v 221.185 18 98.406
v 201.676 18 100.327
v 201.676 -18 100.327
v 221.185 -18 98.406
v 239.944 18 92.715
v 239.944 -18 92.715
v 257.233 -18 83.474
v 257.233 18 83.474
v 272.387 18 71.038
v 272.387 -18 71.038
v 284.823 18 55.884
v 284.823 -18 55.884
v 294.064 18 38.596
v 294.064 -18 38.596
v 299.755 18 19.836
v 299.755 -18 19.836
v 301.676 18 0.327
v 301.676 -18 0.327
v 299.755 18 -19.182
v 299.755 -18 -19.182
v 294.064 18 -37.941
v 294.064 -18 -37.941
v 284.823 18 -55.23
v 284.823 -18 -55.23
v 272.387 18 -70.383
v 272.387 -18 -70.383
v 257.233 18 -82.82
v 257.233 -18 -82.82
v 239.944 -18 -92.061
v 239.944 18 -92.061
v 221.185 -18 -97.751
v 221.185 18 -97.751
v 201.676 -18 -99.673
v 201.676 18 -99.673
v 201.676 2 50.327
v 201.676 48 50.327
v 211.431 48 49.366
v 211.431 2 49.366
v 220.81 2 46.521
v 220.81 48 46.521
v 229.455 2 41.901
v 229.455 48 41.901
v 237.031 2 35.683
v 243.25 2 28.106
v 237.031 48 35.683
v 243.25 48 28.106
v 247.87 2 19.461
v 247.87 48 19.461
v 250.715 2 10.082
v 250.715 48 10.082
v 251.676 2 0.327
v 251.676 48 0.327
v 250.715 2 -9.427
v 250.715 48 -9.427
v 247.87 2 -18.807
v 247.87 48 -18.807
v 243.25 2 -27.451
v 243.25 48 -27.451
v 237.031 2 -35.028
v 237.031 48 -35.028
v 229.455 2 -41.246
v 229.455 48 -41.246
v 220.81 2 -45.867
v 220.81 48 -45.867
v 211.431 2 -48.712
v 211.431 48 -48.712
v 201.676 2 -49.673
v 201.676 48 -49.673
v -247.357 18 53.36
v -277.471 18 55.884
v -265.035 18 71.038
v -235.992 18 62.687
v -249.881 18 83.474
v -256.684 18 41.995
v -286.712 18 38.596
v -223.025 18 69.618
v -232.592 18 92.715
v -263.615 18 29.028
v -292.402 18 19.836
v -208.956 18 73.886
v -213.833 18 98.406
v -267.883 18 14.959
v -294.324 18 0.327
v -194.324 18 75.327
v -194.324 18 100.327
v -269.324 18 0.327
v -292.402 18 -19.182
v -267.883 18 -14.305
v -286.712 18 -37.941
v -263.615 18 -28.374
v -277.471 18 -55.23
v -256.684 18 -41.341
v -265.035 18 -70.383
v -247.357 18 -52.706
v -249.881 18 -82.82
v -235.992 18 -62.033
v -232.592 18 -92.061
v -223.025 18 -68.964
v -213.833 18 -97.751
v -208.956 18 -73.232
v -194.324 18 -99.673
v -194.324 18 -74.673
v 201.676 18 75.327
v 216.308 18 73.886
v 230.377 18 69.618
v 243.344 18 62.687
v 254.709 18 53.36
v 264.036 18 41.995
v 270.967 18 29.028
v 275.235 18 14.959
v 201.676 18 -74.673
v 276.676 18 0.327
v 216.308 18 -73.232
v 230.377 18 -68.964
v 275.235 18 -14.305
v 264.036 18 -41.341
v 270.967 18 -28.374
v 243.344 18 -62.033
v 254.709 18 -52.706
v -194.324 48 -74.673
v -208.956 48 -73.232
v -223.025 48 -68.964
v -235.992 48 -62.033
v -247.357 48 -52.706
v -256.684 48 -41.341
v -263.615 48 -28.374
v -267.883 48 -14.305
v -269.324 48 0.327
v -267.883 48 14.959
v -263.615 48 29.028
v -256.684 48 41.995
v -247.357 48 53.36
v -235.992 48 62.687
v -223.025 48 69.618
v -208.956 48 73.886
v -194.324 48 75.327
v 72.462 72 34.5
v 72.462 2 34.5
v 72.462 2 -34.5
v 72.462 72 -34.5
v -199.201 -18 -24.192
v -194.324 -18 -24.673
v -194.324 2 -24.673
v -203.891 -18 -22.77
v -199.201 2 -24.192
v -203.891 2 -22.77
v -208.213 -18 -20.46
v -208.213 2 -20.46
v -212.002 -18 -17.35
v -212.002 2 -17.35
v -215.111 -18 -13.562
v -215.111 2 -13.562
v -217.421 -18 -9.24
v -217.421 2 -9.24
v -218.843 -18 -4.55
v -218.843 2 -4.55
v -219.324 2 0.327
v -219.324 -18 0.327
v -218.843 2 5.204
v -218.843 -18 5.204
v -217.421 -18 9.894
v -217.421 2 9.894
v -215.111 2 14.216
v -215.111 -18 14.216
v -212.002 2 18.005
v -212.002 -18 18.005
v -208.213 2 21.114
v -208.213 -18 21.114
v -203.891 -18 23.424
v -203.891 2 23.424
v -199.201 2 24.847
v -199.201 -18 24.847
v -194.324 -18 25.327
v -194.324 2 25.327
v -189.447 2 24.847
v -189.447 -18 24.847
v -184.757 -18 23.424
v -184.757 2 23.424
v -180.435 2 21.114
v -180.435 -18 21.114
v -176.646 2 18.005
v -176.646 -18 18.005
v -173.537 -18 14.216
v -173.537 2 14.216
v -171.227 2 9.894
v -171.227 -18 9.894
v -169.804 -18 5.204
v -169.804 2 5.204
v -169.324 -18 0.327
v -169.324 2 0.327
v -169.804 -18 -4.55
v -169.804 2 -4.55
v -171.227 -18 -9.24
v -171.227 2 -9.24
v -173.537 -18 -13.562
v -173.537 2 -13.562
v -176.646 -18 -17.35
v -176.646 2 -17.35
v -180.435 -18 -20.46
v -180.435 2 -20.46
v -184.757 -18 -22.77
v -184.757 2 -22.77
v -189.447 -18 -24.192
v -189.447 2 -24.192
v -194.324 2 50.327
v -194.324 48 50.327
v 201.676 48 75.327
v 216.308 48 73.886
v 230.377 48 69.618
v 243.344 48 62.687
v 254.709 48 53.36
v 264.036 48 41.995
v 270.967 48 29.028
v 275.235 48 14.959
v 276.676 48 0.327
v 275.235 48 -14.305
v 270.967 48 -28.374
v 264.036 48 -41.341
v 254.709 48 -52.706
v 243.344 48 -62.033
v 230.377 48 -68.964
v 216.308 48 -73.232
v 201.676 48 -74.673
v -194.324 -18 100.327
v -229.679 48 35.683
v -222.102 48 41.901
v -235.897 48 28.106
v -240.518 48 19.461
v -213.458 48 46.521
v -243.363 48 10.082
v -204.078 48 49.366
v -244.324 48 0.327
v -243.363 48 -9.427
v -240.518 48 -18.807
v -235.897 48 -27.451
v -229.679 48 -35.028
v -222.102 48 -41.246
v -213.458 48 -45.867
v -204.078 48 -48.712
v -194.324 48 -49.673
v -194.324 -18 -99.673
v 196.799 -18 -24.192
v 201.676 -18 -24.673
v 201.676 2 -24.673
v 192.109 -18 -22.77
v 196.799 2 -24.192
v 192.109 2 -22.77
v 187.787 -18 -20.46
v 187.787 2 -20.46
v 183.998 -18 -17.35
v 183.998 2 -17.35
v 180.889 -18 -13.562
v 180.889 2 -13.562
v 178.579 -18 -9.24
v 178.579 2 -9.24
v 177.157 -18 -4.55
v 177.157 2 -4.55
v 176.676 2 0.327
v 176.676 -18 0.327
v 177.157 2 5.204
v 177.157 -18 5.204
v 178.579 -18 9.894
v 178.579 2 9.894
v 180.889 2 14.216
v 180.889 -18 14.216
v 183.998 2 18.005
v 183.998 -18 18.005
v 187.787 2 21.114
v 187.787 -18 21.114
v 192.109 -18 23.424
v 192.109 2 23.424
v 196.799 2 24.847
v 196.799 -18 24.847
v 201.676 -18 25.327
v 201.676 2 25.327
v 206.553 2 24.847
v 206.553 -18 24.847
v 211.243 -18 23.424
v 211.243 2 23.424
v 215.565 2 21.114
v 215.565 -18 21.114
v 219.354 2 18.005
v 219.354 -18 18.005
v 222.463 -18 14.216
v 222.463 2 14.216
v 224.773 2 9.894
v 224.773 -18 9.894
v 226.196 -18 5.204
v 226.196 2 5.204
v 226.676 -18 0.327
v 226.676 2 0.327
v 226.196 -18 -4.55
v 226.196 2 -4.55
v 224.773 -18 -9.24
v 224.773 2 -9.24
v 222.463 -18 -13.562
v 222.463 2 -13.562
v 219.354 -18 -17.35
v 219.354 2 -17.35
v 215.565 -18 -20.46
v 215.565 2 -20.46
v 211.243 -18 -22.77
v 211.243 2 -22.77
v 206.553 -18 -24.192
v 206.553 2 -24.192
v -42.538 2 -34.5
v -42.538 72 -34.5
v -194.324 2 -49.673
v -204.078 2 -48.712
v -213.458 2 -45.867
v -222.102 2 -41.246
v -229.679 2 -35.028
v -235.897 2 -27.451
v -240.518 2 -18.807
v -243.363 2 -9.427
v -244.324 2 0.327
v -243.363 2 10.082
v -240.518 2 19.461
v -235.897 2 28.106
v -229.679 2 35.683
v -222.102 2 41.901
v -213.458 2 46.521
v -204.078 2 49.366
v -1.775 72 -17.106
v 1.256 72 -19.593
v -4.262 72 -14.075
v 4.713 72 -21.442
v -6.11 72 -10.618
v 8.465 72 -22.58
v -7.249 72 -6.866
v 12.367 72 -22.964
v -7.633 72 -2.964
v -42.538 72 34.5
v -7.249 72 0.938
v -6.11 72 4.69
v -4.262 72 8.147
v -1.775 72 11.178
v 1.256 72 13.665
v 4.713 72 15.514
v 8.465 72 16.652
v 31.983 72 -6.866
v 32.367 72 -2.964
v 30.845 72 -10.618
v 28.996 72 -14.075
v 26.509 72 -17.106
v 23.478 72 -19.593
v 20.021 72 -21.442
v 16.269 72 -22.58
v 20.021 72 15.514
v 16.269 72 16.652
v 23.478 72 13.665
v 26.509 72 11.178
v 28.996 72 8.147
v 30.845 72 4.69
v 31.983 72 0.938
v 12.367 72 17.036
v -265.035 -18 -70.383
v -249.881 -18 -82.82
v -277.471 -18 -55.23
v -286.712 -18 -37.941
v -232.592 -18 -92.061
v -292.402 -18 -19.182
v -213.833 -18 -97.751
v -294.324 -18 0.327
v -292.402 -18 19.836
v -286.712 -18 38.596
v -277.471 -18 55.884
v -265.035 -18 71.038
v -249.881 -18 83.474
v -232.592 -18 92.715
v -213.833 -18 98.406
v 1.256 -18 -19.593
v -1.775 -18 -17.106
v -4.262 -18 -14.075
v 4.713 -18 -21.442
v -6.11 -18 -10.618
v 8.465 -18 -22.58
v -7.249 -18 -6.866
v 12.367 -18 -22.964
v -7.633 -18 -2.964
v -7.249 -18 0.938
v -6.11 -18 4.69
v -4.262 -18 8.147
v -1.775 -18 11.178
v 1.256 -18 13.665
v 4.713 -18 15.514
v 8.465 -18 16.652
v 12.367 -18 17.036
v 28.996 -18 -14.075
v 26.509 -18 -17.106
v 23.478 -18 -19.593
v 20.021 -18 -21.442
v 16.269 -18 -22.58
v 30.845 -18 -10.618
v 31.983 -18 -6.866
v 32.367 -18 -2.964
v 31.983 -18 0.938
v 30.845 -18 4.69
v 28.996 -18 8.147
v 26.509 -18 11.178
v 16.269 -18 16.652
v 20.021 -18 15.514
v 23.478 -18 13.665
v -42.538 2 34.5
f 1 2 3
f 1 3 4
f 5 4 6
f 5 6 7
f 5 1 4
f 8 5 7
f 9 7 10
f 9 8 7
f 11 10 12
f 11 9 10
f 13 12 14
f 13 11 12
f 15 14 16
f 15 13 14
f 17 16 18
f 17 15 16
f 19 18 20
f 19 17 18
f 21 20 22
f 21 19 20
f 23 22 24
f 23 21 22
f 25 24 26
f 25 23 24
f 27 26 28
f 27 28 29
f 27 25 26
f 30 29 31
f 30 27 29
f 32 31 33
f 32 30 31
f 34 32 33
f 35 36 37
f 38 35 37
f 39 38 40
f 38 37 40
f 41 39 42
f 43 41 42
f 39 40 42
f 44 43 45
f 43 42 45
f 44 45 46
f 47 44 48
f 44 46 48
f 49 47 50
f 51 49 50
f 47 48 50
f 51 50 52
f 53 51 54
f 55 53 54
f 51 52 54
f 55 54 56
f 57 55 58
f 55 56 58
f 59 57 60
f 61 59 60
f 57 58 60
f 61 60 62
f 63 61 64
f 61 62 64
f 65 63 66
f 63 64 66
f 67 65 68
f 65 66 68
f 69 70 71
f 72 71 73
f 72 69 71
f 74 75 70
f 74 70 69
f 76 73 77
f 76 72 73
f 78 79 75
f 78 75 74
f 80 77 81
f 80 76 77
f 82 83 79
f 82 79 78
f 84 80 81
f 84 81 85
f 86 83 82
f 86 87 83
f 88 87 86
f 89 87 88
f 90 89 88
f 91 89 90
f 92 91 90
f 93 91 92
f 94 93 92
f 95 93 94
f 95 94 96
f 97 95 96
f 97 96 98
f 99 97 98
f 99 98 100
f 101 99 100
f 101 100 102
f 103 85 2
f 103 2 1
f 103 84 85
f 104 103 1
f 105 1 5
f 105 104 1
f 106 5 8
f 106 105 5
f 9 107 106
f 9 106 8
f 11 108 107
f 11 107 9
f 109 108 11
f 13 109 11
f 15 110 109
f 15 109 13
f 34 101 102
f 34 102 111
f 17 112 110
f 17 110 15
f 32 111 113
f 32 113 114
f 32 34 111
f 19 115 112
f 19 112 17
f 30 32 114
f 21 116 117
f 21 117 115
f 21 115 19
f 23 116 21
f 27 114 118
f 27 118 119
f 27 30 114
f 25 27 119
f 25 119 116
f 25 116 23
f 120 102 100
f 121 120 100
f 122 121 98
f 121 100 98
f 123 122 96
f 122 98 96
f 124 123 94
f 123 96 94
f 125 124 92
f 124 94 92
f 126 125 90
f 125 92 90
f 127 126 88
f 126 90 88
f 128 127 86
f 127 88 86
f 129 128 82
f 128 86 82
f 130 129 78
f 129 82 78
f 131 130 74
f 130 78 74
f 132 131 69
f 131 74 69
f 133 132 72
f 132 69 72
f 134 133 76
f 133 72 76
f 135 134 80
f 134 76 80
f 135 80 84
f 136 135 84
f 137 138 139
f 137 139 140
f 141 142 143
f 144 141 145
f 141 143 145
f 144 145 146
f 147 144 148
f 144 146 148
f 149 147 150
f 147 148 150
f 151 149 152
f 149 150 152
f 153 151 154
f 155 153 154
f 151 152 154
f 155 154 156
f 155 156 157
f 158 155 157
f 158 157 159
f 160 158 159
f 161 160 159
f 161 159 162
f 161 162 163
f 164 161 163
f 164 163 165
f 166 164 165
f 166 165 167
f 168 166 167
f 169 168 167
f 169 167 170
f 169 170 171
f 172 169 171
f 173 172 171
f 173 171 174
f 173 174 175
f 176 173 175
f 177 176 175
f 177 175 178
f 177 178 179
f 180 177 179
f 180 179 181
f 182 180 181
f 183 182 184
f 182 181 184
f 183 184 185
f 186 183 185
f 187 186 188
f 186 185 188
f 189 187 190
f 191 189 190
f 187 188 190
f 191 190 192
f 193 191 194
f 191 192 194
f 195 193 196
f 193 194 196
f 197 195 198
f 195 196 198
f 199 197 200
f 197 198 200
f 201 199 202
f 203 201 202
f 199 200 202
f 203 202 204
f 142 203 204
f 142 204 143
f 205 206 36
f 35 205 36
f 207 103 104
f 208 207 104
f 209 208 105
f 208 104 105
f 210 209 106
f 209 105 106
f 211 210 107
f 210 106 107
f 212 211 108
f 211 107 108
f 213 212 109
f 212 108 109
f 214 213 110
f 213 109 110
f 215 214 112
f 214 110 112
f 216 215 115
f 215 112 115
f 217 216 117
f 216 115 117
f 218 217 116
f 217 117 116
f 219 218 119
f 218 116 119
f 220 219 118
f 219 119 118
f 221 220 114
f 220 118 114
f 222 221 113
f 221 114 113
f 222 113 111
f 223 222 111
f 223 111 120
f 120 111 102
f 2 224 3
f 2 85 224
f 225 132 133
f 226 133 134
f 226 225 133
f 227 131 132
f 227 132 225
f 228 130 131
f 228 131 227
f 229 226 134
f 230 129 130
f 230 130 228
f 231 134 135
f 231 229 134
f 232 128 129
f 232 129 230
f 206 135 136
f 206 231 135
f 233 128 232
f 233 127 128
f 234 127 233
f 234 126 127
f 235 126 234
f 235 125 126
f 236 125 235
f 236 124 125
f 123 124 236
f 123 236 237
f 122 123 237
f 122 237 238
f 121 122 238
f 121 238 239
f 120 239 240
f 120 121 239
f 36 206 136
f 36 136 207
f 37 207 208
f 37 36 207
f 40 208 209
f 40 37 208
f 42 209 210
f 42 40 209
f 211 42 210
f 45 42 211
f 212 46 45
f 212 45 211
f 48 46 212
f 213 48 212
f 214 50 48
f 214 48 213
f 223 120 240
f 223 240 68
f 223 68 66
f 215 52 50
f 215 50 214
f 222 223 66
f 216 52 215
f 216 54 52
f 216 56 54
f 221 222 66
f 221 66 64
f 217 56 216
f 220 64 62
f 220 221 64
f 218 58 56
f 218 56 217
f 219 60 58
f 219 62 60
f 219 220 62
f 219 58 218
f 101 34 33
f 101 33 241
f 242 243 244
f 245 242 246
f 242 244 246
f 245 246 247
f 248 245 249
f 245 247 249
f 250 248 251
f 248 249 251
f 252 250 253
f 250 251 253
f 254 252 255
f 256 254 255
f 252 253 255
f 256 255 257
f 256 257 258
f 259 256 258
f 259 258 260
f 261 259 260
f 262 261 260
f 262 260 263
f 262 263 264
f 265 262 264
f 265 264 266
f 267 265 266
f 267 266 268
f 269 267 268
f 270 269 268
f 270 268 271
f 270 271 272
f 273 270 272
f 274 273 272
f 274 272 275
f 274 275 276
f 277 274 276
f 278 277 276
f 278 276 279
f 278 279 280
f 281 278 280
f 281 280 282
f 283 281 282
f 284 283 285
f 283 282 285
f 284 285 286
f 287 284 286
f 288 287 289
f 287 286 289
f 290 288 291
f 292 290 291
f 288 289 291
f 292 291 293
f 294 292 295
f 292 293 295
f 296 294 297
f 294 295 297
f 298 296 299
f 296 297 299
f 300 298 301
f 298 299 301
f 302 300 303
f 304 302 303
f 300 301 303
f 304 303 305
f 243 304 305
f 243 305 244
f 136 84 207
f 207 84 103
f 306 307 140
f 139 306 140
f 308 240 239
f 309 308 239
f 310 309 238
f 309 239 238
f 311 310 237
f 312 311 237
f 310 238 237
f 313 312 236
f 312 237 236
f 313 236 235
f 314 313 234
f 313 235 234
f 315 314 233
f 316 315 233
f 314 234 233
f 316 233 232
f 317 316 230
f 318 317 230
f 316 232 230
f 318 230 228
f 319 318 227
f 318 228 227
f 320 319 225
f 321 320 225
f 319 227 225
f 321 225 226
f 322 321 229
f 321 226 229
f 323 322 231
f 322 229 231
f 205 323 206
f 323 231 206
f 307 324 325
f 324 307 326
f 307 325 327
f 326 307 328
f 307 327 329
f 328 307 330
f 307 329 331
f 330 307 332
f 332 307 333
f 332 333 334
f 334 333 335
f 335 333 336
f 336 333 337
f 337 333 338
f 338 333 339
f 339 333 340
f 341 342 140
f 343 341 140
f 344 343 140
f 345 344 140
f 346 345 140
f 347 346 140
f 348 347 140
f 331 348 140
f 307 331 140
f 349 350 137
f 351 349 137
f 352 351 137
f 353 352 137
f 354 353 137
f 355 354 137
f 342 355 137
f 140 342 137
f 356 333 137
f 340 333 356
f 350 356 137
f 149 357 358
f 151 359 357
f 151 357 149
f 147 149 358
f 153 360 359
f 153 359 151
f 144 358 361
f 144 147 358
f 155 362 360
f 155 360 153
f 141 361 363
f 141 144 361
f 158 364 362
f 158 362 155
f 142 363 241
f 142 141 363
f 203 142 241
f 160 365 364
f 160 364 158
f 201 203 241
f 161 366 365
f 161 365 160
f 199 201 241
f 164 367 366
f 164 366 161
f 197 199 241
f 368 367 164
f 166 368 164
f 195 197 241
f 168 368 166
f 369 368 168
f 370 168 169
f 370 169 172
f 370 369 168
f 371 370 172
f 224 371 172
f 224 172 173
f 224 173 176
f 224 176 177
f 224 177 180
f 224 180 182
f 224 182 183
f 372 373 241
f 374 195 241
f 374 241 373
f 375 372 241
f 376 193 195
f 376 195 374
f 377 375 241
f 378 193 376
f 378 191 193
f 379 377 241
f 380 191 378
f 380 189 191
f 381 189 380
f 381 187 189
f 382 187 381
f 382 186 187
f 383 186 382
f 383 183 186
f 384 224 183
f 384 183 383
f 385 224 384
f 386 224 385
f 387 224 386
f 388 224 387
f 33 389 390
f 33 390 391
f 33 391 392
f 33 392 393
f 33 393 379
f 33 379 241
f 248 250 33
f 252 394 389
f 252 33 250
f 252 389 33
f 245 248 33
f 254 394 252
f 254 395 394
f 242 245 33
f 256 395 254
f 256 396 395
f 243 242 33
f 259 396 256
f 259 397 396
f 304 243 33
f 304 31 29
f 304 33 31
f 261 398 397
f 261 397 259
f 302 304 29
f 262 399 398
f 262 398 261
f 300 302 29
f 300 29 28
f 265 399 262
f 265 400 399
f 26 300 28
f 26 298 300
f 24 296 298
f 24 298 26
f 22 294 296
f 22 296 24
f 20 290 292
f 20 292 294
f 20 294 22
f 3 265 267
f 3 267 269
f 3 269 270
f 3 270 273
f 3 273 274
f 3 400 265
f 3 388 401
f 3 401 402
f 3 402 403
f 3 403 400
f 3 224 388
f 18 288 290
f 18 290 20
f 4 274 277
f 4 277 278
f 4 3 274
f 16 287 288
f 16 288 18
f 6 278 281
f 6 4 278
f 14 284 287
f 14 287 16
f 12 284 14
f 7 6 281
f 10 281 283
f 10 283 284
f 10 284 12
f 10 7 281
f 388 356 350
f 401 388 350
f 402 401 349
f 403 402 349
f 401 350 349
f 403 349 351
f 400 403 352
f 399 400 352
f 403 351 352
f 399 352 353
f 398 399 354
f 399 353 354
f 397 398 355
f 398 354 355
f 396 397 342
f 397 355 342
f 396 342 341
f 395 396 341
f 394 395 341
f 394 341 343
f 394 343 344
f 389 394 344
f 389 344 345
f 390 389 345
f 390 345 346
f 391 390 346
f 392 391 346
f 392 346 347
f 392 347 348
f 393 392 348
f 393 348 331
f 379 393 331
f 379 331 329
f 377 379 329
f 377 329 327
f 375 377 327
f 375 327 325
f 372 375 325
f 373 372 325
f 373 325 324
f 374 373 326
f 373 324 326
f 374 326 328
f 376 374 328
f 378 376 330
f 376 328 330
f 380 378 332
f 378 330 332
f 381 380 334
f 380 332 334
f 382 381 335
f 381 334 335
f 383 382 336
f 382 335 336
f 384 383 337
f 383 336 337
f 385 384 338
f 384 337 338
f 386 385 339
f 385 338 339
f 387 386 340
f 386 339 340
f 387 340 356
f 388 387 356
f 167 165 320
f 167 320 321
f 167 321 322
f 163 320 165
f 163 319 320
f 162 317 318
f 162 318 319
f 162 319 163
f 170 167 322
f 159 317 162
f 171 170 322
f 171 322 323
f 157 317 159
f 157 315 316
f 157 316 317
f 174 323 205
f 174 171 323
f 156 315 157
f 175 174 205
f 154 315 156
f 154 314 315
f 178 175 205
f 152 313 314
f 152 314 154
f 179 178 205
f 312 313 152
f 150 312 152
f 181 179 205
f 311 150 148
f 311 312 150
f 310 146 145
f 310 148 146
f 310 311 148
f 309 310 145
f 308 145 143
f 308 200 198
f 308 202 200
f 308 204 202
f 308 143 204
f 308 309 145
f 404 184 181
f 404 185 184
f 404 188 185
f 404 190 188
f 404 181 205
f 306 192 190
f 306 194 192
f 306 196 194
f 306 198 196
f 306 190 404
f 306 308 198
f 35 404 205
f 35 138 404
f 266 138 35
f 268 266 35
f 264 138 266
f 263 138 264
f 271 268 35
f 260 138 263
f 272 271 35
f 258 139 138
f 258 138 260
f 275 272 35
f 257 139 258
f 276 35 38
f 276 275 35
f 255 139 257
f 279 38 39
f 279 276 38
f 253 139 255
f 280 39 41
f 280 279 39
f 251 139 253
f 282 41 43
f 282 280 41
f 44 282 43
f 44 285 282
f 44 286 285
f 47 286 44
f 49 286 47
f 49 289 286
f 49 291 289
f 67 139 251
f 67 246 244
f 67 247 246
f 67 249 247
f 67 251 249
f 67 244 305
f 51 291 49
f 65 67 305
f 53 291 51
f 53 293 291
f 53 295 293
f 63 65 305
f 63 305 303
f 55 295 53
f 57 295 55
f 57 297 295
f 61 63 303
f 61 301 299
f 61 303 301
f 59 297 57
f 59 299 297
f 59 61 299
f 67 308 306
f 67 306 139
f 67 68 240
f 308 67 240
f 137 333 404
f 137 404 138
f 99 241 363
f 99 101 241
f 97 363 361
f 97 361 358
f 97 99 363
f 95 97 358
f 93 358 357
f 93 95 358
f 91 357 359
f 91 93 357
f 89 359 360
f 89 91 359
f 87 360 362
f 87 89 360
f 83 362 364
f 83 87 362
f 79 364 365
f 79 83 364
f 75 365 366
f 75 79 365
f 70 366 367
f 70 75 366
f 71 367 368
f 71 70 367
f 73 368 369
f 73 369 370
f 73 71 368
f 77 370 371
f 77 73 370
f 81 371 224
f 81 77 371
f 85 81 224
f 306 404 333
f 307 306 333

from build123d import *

# Parameters (mm, degrees)
SALIENTE_EXTRUIR1_DEPTH = 18
SALIENTE_EXTRUIR6_START = -36
SALIENTE_EXTRUIR6_DEPTH = 66
CORTAR_EXTRUIR1_START   = 48
CORTAR_EXTRUIR1_DEPTH   = 46
CORTAR_EXTRUIR2_START   = 18
CROQUIS4_R              = 25
CORTAR_EXTRUIR2_DEPTH   = 340.524582953
CROQUIS5_W              = 115
CROQUIS5_H              = 90
SALIENTE_EXTRUIR7_DEPTH = 34.5
CORTAR_EXTRUIR3_START   = 72
CROQUIS7_R              = 20
CORTAR_EXTRUIR3_DEPTH   = 398.972479579


with BuildPart() as part:
    # Croquis1 → Saliente-Extruir1 (new, symmetric)
    with BuildSketch(Plane(origin=(0, 0, 0), x_dir=(1, 0, 0), z_dir=(0, 1, 0))):
        with BuildLine():
            Line((-194.323843522, -100.327234865), (201.676156478, -100.327234865))
            ThreePointArc((201.676156478, -100.327234865), (301.676156478, -0.327234865), (201.676156478, 99.672765135))
            Line((201.676156478, 99.672765135), (-194.323843522, 99.672765135))
            ThreePointArc((-194.323843522, 99.672765135), (-294.323843522, -0.327234865), (-194.323843522, -100.327234865))
        make_face()
    extrude(amount=SALIENTE_EXTRUIR1_DEPTH, both=True)

    # Croquis2 → Saliente-Extruir6 (add)
    with BuildSketch(Plane(origin=(0, 18, 0), x_dir=(1, 0, 0), z_dir=(0, 1, 0)).offset(SALIENTE_EXTRUIR6_START)):
        with BuildLine():
            Line((-194.323843522, -75.327234865), (201.676156478, -75.327234865))
            ThreePointArc((201.676156478, -75.327234865), (276.676156478, -0.327234865), (201.676156478, 74.672765135))
            Line((201.676156478, 74.672765135), (-194.323843522, 74.672765135))
            ThreePointArc((-194.323843522, 74.672765135), (-269.323843522, -0.327234865), (-194.323843522, -75.327234865))
        make_face()
    extrude(amount=SALIENTE_EXTRUIR6_DEPTH)

    # Croquis3 → Cortar-Extruir1 (cut)
    with BuildSketch(Plane(origin=(0, 0, 0), x_dir=(1, 0, 0), z_dir=(0, 1, 0)).offset(CORTAR_EXTRUIR1_START)):
        with BuildLine():
            Line((-194.323843522, -50.327234865), (201.676156478, -50.327234865))
            ThreePointArc((201.676156478, -50.327234865), (251.676156478, -0.327234865), (201.676156478, 49.672765135))
            Line((201.676156478, 49.672765135), (-194.323843522, 49.672765135))
            ThreePointArc((-194.323843522, 49.672765135), (-244.323843522, -0.327234865), (-194.323843522, -50.327234865))
        make_face()
    extrude(amount=-CORTAR_EXTRUIR1_DEPTH, mode=Mode.SUBTRACT)

    # Croquis4 → Cortar-Extruir2 (cut, through all)
    with BuildSketch(Plane(origin=(0, 0, 0), x_dir=(1, 0, 0), z_dir=(0, 1, 0)).offset(CORTAR_EXTRUIR2_START)):
        with Locations(Location((-194.323843522, -0.327234865, 0), (0, 0, 90))):
            Circle(CROQUIS4_R)
        with Locations(Location((201.676156478, -0.327234865, 0), (0, 0, 90))):
            Circle(CROQUIS4_R)
    extrude(amount=-CORTAR_EXTRUIR2_DEPTH, mode=Mode.SUBTRACT)

    # Croquis5 → Saliente-Extruir7 (add, symmetric)
    with BuildSketch(Plane.XY):
        with Locations((14.961556785, 27)):
            Rectangle(CROQUIS5_W, CROQUIS5_H)
    extrude(amount=SALIENTE_EXTRUIR7_DEPTH, both=True)

    # Croquis7 → Cortar-Extruir3 (cut, through all)
    with BuildSketch(Plane(origin=(0, 0, 0), x_dir=(1, 0, 0), z_dir=(0, 1, 0)).offset(CORTAR_EXTRUIR3_START)):
        with Locations(Location((12.367095305, 2.963956449, 0), (0, 0, 270))):
            Circle(CROQUIS7_R)
    extrude(amount=-CORTAR_EXTRUIR3_DEPTH, mode=Mode.SUBTRACT)


solid = part.part
